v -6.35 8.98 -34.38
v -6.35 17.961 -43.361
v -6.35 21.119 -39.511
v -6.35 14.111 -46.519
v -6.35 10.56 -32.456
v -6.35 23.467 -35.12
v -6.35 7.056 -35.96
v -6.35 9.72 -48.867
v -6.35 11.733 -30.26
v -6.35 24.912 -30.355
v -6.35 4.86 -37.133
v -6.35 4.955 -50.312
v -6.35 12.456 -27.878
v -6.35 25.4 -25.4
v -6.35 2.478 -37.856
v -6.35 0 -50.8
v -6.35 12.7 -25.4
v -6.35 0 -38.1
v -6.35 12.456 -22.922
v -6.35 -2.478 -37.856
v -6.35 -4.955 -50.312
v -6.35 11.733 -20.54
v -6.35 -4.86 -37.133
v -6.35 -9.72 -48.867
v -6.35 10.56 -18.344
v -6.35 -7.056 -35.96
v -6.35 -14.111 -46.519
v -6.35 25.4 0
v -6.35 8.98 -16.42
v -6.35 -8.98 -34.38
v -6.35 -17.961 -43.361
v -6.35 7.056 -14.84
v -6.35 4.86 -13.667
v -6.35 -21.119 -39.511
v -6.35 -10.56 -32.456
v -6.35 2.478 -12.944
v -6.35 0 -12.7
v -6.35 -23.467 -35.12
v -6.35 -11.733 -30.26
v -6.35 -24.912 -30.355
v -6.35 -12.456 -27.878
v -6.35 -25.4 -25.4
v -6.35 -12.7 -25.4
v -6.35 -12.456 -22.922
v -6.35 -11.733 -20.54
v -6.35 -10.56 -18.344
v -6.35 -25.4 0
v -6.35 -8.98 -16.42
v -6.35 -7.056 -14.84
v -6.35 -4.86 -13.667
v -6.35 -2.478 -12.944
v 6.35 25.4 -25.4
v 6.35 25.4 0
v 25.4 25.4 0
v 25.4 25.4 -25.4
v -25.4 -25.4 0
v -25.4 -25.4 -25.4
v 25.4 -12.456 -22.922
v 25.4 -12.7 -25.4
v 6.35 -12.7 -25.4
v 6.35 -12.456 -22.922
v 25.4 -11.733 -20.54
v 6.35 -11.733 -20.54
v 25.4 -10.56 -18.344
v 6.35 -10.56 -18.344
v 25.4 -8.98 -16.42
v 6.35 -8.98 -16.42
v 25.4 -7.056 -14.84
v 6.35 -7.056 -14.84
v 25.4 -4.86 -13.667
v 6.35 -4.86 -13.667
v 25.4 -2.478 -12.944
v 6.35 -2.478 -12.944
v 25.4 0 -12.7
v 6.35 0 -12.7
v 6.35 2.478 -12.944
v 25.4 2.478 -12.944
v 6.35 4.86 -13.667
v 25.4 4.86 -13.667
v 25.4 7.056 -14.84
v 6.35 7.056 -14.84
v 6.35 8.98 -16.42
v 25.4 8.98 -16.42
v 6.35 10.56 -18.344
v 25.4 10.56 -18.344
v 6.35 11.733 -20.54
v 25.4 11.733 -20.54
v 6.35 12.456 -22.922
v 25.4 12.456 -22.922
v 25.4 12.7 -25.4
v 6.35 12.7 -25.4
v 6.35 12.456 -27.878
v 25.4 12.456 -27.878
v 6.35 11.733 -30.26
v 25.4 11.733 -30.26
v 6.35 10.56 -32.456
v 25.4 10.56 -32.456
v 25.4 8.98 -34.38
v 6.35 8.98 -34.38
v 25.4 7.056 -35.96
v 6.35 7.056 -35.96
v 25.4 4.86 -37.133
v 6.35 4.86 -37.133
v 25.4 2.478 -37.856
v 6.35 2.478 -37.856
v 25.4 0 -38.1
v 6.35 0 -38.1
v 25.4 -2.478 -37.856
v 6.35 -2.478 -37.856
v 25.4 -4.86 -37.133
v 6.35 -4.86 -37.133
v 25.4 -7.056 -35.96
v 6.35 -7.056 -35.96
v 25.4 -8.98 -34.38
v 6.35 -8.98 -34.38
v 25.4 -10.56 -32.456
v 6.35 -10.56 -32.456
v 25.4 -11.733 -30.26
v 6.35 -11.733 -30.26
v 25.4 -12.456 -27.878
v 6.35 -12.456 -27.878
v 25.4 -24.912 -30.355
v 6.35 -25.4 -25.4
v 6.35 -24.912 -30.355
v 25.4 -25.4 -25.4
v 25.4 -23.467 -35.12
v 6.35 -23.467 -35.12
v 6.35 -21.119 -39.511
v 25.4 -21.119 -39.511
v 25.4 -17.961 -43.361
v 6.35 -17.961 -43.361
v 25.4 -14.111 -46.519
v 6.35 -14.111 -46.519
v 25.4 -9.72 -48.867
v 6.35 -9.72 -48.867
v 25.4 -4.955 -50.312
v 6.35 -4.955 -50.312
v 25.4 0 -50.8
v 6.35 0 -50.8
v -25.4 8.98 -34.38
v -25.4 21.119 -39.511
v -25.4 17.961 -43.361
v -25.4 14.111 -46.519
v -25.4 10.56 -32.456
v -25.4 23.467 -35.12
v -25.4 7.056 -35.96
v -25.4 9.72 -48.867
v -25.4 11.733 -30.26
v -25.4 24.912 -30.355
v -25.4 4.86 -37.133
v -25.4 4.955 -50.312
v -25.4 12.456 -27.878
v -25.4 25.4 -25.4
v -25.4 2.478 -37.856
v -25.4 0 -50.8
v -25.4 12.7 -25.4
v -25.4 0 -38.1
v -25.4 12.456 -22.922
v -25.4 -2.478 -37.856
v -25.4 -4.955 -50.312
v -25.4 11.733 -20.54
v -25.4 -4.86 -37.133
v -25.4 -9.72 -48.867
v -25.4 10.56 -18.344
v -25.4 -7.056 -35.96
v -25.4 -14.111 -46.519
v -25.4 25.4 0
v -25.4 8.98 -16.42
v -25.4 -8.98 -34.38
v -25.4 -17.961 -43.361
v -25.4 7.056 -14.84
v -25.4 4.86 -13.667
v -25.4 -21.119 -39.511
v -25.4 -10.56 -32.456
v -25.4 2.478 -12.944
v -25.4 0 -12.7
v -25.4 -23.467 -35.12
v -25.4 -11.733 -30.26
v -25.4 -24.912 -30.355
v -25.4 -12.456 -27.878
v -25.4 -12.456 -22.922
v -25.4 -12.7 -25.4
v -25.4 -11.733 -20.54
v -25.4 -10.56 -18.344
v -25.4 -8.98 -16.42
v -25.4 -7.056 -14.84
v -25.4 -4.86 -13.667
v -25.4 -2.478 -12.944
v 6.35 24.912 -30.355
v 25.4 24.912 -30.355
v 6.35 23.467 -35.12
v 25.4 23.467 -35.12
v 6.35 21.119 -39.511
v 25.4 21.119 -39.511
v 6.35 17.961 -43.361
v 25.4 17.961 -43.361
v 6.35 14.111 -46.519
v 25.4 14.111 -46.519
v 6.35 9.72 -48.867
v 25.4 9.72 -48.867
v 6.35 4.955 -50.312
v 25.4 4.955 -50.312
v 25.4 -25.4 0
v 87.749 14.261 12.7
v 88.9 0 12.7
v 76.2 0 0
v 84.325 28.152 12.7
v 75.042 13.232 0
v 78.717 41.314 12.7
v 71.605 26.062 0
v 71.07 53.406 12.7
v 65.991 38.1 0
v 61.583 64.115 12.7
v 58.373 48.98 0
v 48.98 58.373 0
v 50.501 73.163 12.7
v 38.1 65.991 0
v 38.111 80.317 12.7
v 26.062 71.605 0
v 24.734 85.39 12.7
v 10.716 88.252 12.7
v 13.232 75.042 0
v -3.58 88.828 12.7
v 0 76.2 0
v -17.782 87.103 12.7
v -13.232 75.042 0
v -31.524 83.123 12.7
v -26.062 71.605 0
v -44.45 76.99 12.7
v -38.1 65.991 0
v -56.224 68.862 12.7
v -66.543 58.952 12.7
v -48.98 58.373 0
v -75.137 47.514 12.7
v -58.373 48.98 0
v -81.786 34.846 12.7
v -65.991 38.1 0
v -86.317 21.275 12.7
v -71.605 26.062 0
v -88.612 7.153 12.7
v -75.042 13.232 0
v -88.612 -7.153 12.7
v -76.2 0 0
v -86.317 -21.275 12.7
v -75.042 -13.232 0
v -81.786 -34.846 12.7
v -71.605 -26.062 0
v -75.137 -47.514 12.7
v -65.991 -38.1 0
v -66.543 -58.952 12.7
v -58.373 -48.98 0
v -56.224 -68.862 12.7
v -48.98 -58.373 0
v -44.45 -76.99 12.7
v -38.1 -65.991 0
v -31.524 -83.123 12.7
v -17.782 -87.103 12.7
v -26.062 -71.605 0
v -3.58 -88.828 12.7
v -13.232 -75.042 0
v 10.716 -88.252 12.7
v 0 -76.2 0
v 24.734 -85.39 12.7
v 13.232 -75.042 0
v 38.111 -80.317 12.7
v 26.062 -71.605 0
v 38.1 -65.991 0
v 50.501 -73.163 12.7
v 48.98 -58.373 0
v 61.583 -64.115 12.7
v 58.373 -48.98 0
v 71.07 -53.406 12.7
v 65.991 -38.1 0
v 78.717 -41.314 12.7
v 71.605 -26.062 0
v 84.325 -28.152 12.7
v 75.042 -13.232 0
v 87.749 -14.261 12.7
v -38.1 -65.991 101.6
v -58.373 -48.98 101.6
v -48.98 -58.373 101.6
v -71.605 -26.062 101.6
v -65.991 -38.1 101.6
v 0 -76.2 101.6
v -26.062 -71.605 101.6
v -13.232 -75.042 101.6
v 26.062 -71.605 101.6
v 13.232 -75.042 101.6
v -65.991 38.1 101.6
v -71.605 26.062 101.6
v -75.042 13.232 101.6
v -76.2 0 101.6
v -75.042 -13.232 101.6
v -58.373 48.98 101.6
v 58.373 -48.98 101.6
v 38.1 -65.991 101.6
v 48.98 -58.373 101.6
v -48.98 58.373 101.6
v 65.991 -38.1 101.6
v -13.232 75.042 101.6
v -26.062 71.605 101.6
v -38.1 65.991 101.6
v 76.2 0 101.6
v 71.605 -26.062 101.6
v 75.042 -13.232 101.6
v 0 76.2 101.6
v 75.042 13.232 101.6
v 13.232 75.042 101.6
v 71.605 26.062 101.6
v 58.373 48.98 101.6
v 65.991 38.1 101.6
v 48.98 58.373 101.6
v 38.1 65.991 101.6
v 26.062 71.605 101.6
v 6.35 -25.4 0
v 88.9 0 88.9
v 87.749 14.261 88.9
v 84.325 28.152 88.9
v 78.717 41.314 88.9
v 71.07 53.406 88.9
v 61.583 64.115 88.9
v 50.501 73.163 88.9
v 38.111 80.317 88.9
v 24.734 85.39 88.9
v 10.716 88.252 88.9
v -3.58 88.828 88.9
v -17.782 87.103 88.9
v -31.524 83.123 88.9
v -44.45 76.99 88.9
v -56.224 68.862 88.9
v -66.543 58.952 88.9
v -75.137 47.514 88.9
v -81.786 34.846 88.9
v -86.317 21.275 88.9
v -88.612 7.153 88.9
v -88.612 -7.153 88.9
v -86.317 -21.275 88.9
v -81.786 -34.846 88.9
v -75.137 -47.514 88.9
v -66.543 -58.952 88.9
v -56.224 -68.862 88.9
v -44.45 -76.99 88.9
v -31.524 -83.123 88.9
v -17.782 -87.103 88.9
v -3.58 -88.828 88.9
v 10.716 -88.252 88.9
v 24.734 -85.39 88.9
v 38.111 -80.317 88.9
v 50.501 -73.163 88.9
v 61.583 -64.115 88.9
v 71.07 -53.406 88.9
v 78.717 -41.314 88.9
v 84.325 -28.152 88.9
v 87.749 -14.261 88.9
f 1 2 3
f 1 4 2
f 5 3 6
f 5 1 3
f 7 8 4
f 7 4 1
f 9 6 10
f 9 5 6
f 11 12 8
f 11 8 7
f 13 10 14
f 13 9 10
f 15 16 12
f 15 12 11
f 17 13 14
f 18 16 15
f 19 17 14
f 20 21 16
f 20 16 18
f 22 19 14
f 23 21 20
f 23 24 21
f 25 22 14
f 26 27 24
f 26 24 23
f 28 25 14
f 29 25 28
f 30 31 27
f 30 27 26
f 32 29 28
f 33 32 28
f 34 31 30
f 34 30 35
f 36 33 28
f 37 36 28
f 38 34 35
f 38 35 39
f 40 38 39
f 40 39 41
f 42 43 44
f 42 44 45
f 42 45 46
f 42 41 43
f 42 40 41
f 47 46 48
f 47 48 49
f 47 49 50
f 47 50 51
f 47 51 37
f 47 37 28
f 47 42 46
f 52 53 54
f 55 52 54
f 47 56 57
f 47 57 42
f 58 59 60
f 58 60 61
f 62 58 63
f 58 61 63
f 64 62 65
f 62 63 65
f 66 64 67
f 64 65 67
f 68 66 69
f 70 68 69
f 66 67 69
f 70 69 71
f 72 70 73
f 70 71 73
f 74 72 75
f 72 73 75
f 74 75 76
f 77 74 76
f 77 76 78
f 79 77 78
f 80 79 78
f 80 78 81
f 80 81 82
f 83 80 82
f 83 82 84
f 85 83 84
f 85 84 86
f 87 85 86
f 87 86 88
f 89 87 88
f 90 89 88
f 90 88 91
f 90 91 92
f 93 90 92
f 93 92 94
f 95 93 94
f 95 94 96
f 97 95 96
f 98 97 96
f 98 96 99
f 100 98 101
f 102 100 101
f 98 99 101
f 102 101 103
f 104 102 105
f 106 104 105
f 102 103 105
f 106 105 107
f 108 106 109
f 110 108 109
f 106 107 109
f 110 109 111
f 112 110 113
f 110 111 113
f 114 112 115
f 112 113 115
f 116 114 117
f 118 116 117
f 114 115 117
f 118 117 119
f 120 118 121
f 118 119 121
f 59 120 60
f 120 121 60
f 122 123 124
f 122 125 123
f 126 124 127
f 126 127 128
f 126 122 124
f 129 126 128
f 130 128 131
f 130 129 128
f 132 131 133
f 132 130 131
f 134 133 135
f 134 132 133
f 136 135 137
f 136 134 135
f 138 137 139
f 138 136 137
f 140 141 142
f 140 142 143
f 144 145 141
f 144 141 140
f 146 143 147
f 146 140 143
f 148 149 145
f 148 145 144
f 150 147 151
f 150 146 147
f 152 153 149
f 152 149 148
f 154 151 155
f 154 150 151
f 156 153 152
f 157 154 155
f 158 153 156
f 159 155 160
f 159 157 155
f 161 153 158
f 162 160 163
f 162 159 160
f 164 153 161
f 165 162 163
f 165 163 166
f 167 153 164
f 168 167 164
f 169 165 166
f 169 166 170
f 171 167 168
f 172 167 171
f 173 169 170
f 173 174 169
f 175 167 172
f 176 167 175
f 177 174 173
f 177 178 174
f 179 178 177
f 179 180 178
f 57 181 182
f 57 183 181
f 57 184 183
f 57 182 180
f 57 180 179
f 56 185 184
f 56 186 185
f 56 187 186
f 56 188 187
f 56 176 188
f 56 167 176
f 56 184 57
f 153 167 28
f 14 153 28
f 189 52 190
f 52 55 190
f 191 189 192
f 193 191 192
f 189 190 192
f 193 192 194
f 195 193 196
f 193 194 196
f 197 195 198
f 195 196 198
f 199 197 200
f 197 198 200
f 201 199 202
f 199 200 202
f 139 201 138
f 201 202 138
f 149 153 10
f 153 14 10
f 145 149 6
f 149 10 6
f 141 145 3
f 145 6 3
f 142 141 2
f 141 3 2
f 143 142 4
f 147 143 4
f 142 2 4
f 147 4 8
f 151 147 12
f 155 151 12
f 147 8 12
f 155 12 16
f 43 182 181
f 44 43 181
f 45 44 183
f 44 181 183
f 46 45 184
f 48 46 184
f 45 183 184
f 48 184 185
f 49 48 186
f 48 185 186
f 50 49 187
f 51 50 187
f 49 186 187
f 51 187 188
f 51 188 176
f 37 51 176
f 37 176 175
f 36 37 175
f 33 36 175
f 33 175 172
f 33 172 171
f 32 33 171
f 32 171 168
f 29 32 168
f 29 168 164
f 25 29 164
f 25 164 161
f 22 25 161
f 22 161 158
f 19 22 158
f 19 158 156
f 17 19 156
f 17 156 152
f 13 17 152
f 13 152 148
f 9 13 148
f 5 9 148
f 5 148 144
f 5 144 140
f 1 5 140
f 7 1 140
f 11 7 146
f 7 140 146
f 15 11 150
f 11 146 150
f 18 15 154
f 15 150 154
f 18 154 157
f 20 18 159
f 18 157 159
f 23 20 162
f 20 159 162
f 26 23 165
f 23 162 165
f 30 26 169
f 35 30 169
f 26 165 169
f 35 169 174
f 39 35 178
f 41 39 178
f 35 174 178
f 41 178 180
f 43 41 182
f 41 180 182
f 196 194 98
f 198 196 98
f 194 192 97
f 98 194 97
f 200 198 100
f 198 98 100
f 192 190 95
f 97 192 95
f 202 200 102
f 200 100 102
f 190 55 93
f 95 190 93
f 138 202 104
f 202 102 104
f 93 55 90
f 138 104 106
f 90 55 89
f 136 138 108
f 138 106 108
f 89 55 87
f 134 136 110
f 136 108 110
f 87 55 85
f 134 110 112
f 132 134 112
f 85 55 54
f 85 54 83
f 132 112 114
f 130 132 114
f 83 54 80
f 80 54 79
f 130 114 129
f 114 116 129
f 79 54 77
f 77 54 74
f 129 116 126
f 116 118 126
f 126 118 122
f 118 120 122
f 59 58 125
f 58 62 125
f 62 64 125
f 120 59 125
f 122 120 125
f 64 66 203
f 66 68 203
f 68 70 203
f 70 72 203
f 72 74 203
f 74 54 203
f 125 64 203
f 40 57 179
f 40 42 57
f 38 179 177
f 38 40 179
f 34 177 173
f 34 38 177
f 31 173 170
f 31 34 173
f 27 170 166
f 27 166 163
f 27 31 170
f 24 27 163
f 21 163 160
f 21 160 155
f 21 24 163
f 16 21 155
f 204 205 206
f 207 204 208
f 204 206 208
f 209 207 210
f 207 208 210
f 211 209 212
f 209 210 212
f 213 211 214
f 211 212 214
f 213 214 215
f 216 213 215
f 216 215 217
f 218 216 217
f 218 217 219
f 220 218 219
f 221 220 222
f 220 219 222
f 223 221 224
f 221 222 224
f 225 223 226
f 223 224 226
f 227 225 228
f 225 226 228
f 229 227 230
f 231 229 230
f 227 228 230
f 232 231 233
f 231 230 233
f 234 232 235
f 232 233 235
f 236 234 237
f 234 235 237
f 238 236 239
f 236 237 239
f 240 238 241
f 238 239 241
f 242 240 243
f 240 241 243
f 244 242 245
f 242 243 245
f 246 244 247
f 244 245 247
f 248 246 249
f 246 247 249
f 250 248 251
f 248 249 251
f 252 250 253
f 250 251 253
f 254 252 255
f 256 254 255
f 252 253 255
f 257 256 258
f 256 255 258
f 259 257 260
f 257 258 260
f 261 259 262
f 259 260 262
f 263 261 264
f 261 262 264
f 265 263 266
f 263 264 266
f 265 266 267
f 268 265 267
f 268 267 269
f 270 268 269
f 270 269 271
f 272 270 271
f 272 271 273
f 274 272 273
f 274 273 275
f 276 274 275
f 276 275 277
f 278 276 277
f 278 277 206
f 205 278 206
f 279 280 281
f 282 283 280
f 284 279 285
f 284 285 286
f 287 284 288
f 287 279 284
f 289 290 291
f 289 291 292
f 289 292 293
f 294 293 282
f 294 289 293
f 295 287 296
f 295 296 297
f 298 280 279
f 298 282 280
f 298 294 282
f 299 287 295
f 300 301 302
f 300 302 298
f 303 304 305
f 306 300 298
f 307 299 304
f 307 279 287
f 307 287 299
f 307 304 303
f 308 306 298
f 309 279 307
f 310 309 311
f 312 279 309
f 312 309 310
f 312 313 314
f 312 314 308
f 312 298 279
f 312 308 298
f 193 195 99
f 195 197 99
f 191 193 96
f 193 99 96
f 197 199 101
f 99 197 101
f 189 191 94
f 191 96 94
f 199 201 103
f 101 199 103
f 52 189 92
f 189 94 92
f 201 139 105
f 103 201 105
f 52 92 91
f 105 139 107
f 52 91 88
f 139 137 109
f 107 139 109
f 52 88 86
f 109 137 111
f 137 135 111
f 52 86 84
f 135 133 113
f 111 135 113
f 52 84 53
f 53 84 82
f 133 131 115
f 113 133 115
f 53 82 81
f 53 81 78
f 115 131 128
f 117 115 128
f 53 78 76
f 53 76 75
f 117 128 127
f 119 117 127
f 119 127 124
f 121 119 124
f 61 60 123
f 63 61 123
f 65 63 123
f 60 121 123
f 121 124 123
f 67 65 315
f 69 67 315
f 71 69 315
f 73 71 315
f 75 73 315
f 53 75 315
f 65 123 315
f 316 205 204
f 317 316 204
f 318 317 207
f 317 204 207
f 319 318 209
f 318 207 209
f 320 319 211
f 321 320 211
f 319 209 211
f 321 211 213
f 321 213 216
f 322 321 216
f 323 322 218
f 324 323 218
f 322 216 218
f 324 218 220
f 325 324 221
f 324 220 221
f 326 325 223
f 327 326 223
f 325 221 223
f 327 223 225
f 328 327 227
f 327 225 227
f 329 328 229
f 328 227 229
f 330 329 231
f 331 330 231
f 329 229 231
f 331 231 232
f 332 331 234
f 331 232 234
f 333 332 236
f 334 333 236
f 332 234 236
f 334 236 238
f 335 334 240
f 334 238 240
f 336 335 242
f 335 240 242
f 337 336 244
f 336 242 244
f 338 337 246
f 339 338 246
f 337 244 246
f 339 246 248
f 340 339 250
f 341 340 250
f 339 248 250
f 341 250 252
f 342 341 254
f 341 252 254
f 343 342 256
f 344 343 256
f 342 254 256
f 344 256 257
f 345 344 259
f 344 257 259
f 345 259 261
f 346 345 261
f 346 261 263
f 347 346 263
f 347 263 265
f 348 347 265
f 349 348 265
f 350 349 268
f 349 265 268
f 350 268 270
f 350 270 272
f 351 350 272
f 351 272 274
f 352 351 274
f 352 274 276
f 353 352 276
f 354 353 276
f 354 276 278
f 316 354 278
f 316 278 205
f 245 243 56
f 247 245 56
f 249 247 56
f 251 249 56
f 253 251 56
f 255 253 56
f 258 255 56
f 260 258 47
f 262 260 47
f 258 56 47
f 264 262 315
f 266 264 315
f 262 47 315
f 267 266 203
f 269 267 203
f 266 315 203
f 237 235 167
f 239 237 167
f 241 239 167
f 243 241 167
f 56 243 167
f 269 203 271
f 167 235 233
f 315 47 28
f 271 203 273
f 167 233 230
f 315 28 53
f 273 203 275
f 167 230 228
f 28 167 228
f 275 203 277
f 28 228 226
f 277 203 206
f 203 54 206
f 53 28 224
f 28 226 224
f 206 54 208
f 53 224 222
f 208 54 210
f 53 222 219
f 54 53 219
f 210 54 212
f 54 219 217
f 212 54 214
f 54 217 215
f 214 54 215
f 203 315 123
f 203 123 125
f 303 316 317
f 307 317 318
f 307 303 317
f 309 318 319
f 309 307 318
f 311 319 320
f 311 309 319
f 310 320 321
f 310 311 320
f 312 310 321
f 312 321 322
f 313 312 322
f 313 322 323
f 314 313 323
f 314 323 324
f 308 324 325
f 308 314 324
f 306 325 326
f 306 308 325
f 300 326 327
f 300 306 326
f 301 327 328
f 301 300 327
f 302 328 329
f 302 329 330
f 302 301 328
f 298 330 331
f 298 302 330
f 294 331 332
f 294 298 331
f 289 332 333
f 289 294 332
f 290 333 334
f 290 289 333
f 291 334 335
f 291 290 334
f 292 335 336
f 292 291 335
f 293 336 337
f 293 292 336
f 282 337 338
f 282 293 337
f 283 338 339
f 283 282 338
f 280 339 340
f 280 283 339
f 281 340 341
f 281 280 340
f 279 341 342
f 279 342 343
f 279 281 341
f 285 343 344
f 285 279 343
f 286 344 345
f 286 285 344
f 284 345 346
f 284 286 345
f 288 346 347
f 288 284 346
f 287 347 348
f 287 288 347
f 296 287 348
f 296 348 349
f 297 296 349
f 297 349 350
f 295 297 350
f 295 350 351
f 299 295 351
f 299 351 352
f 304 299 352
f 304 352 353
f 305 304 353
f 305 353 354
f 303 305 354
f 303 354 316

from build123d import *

# Parameters (mm, degrees)
F0_R     = 88.9
F1_DEPTH = 101.6
F2_SIZE  = 12.7
F3_W     = 50.8
F3_H     = 50.8
F4_DEPTH = 50.8
F5_W     = 12.7
F5_H     = 50.8
F6_DEPTH = 50.8
F7_R     = 25.39999
F8_R     = 12.7
F9_DEPTH = 50.8


# Not quite as in the source:
# - a fillet or chamfer is up to 0.001 mm smaller than in the source, because OpenCascade refuses the exact size


with BuildPart() as f1:
    # F0 (on Top) → F1 (new body)
    with BuildSketch(Plane.XY):
        Circle(F0_R)
    extrude(amount=F1_DEPTH)

    # F2
    f2_edges = [f1.edges().sort_by_distance(p)[0] for p in [
        (-88.9, 0, 101.6),
        (-88.9, 0, 0),
    ]]
    chamfer(f2_edges, length=F2_SIZE)

    # F3 (on face) → F4 (join)
    with BuildSketch(Plane(origin=(0, 0, 0), x_dir=(1, 0, 0), z_dir=(0, 0, -1))):
        Rectangle(F3_W, F3_H)
    extrude(amount=F4_DEPTH)

    # F5 (on face) → F6 (cut)
    with BuildSketch(Plane.XZ.offset(25.4)):
        with Locations((0, -25.4)):
            Rectangle(F5_W, F5_H)
    extrude(amount=-F6_DEPTH, mode=Mode.SUBTRACT)

    # F7 (radius 25.4 in the source; OpenCascade refuses exactly that, so slightly less here)
    f7_edges = [f1.edges().sort_by_distance(p)[0] for p in [
        (-15.875, -25.4, -50.8),
        (-15.875, 25.4, -50.8),
        (15.875, 25.4, -50.8),
        (15.875, -25.4, -50.8),
    ]]
    fillet(f7_edges, radius=F7_R)

    # F8 (on face) → F9 (cut, through all)
    with BuildSketch(Plane(origin=(-25.4, 0, 0), x_dir=(0, -1, 0), z_dir=(-1, 0, 0))):
        with Locations((0, -25.4)):
            Circle(F8_R)
    extrude(amount=-F9_DEPTH, mode=Mode.SUBTRACT)


solid = f1.part
